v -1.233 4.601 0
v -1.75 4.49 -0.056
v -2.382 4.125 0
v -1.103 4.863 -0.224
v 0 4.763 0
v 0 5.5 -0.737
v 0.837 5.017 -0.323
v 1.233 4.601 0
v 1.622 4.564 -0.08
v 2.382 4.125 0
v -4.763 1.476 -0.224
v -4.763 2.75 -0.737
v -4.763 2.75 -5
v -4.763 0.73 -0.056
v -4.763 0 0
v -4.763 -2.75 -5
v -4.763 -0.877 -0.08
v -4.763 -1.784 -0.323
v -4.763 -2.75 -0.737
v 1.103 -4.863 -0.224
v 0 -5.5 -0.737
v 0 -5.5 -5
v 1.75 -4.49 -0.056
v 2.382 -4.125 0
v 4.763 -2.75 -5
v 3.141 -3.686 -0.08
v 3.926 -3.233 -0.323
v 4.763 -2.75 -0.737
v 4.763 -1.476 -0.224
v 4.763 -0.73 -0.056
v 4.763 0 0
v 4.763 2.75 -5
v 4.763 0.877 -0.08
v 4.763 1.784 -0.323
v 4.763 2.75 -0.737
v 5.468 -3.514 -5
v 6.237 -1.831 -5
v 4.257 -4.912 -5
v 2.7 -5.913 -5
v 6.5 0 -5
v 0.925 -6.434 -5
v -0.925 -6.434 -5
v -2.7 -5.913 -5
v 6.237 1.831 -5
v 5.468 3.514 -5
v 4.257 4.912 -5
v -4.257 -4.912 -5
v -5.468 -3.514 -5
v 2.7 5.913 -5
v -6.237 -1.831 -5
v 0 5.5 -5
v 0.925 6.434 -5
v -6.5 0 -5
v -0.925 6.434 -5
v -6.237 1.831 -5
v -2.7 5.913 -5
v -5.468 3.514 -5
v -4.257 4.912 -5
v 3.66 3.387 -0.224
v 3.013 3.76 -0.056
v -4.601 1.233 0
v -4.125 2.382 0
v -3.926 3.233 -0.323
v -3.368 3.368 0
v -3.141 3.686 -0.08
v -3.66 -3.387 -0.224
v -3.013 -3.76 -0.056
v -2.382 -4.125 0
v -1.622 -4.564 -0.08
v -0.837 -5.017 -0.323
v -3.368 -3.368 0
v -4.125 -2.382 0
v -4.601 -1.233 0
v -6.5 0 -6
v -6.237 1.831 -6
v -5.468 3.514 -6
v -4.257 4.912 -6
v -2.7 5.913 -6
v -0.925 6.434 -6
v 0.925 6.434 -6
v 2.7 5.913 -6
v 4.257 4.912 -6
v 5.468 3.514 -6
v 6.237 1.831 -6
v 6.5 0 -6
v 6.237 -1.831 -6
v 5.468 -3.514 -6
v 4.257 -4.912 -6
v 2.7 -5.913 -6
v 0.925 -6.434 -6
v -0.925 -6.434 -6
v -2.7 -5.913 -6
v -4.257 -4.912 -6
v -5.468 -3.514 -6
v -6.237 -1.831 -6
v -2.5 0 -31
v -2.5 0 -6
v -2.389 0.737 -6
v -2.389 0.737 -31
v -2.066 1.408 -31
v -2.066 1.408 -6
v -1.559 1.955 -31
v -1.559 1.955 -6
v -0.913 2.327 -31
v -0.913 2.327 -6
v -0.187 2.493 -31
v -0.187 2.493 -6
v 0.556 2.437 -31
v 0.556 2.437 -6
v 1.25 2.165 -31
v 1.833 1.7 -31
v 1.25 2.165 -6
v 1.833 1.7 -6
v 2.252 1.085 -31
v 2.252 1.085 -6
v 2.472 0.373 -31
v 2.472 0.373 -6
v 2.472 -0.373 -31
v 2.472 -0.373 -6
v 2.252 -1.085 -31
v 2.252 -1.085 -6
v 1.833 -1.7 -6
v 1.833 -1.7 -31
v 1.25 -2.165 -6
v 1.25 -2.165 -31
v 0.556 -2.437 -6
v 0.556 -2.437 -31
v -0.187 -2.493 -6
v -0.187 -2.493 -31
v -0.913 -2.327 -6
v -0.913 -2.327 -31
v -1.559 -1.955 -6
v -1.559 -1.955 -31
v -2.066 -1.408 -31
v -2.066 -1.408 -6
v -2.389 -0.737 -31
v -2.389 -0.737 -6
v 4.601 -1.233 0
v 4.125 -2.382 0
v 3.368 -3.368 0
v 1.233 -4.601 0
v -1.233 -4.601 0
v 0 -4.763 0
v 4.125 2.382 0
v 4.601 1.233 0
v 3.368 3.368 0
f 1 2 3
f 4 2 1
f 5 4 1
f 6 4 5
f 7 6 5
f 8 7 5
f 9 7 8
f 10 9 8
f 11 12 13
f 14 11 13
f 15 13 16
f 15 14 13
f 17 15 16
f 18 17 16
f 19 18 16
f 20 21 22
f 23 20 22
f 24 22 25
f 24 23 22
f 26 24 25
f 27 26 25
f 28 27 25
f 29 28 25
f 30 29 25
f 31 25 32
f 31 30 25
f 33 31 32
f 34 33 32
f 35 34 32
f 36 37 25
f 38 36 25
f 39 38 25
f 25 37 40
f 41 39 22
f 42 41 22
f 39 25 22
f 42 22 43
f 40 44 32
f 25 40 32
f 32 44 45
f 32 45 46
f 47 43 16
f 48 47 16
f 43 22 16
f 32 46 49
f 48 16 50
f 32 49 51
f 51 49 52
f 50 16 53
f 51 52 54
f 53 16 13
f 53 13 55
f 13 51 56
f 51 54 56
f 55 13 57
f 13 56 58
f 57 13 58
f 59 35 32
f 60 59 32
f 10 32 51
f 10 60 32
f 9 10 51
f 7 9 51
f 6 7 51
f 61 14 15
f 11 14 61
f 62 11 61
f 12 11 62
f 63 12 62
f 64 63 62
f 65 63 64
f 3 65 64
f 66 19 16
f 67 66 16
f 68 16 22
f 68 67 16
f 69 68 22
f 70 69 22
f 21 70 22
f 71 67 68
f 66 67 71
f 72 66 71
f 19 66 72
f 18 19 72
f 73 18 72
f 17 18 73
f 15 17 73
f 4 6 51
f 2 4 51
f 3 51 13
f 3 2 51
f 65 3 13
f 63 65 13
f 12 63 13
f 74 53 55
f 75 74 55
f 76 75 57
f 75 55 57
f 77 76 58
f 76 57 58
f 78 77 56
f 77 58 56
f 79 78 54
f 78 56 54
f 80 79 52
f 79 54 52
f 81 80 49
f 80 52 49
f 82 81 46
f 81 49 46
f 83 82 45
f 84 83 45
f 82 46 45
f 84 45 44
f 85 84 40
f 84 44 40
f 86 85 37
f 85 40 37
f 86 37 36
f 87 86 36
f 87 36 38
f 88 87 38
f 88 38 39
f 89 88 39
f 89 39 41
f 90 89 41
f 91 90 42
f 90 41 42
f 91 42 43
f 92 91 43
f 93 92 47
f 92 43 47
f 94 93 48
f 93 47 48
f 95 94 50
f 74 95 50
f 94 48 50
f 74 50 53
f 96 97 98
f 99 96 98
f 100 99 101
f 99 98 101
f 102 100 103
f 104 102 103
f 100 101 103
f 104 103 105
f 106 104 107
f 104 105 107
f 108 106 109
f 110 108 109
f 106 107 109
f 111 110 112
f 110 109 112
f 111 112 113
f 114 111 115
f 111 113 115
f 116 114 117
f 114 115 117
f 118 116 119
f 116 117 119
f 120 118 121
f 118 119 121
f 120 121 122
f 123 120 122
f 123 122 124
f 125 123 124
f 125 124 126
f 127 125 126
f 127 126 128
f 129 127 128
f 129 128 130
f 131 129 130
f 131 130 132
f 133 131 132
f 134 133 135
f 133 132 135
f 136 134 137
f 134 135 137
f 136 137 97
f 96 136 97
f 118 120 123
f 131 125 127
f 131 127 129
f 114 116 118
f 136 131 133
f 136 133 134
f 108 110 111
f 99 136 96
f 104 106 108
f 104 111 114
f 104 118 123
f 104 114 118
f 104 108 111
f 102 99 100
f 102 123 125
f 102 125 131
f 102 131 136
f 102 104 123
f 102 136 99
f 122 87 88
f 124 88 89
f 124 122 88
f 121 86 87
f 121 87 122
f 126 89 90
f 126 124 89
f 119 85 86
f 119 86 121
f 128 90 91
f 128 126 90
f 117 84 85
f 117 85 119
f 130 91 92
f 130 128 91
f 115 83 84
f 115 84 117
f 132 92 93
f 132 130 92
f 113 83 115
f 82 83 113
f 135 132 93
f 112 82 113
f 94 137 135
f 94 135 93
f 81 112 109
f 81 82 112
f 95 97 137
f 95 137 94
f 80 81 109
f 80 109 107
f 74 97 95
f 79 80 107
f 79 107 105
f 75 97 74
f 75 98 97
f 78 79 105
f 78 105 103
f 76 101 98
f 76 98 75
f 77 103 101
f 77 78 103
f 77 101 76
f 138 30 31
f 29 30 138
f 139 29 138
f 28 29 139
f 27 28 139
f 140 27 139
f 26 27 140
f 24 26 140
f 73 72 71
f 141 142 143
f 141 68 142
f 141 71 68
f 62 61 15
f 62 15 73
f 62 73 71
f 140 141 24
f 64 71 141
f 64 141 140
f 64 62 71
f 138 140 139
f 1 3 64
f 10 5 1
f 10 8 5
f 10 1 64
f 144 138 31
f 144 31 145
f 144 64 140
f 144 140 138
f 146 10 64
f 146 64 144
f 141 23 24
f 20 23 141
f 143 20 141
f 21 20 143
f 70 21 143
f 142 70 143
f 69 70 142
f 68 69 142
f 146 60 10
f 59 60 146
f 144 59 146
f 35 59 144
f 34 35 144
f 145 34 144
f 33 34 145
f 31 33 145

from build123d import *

# Parameters (mm, degrees)
BOSS_EXTRUDE1_DEPTH = 5
SKETCH2_OUTSIDE_W   = 24.604
SKETCH2_OUTSIDE_H   = 26.078
SKETCH2_OUTSIDE_R   = 4.763139721
CUT_EXTRUDE2_DEPTH  = 5
CUT_EXTRUDE2_TAPER  = 45
SKETCH5_R           = 6.5
BOSS_EXTRUDE2_DEPTH = 1
SKETCH6_R           = 2.5
BOSS_EXTRUDE3_DEPTH = 25


with BuildPart() as part:
    # Sketch1 → Boss-Extrude1 (new body)
    with BuildSketch(Plane.XY):
        Polygon((0, -5.5), (4.763139721, -2.75), (4.763139721, 2.75), (0, 5.5), (-4.763139721, 2.75), (-4.763139721, -2.75), align=None)
    extrude(amount=-BOSS_EXTRUDE1_DEPTH)

    # Sketch2 outside → Cut-Extrude2 (cut)
    with BuildSketch(Plane.XY):
        Rectangle(SKETCH2_OUTSIDE_W, SKETCH2_OUTSIDE_H)
        Circle(SKETCH2_OUTSIDE_R, mode=Mode.SUBTRACT)
    extrude(amount=-CUT_EXTRUDE2_DEPTH, taper=CUT_EXTRUDE2_TAPER, mode=Mode.SUBTRACT)

    # Sketch5 → Boss-Extrude2 (add)
    with BuildSketch(Plane(origin=(0, 0, -5), x_dir=(-1, 0, 0), z_dir=(0, 0, -1))):
        Circle(SKETCH5_R)
    extrude(amount=BOSS_EXTRUDE2_DEPTH)

    # Sketch6 → Boss-Extrude3 (add)
    with BuildSketch(Plane(origin=(0, 0, -6), x_dir=(-1, 0, 0), z_dir=(0, 0, -1))):
        Circle(SKETCH6_R)
    extrude(amount=BOSS_EXTRUDE3_DEPTH)


solid = part.part
